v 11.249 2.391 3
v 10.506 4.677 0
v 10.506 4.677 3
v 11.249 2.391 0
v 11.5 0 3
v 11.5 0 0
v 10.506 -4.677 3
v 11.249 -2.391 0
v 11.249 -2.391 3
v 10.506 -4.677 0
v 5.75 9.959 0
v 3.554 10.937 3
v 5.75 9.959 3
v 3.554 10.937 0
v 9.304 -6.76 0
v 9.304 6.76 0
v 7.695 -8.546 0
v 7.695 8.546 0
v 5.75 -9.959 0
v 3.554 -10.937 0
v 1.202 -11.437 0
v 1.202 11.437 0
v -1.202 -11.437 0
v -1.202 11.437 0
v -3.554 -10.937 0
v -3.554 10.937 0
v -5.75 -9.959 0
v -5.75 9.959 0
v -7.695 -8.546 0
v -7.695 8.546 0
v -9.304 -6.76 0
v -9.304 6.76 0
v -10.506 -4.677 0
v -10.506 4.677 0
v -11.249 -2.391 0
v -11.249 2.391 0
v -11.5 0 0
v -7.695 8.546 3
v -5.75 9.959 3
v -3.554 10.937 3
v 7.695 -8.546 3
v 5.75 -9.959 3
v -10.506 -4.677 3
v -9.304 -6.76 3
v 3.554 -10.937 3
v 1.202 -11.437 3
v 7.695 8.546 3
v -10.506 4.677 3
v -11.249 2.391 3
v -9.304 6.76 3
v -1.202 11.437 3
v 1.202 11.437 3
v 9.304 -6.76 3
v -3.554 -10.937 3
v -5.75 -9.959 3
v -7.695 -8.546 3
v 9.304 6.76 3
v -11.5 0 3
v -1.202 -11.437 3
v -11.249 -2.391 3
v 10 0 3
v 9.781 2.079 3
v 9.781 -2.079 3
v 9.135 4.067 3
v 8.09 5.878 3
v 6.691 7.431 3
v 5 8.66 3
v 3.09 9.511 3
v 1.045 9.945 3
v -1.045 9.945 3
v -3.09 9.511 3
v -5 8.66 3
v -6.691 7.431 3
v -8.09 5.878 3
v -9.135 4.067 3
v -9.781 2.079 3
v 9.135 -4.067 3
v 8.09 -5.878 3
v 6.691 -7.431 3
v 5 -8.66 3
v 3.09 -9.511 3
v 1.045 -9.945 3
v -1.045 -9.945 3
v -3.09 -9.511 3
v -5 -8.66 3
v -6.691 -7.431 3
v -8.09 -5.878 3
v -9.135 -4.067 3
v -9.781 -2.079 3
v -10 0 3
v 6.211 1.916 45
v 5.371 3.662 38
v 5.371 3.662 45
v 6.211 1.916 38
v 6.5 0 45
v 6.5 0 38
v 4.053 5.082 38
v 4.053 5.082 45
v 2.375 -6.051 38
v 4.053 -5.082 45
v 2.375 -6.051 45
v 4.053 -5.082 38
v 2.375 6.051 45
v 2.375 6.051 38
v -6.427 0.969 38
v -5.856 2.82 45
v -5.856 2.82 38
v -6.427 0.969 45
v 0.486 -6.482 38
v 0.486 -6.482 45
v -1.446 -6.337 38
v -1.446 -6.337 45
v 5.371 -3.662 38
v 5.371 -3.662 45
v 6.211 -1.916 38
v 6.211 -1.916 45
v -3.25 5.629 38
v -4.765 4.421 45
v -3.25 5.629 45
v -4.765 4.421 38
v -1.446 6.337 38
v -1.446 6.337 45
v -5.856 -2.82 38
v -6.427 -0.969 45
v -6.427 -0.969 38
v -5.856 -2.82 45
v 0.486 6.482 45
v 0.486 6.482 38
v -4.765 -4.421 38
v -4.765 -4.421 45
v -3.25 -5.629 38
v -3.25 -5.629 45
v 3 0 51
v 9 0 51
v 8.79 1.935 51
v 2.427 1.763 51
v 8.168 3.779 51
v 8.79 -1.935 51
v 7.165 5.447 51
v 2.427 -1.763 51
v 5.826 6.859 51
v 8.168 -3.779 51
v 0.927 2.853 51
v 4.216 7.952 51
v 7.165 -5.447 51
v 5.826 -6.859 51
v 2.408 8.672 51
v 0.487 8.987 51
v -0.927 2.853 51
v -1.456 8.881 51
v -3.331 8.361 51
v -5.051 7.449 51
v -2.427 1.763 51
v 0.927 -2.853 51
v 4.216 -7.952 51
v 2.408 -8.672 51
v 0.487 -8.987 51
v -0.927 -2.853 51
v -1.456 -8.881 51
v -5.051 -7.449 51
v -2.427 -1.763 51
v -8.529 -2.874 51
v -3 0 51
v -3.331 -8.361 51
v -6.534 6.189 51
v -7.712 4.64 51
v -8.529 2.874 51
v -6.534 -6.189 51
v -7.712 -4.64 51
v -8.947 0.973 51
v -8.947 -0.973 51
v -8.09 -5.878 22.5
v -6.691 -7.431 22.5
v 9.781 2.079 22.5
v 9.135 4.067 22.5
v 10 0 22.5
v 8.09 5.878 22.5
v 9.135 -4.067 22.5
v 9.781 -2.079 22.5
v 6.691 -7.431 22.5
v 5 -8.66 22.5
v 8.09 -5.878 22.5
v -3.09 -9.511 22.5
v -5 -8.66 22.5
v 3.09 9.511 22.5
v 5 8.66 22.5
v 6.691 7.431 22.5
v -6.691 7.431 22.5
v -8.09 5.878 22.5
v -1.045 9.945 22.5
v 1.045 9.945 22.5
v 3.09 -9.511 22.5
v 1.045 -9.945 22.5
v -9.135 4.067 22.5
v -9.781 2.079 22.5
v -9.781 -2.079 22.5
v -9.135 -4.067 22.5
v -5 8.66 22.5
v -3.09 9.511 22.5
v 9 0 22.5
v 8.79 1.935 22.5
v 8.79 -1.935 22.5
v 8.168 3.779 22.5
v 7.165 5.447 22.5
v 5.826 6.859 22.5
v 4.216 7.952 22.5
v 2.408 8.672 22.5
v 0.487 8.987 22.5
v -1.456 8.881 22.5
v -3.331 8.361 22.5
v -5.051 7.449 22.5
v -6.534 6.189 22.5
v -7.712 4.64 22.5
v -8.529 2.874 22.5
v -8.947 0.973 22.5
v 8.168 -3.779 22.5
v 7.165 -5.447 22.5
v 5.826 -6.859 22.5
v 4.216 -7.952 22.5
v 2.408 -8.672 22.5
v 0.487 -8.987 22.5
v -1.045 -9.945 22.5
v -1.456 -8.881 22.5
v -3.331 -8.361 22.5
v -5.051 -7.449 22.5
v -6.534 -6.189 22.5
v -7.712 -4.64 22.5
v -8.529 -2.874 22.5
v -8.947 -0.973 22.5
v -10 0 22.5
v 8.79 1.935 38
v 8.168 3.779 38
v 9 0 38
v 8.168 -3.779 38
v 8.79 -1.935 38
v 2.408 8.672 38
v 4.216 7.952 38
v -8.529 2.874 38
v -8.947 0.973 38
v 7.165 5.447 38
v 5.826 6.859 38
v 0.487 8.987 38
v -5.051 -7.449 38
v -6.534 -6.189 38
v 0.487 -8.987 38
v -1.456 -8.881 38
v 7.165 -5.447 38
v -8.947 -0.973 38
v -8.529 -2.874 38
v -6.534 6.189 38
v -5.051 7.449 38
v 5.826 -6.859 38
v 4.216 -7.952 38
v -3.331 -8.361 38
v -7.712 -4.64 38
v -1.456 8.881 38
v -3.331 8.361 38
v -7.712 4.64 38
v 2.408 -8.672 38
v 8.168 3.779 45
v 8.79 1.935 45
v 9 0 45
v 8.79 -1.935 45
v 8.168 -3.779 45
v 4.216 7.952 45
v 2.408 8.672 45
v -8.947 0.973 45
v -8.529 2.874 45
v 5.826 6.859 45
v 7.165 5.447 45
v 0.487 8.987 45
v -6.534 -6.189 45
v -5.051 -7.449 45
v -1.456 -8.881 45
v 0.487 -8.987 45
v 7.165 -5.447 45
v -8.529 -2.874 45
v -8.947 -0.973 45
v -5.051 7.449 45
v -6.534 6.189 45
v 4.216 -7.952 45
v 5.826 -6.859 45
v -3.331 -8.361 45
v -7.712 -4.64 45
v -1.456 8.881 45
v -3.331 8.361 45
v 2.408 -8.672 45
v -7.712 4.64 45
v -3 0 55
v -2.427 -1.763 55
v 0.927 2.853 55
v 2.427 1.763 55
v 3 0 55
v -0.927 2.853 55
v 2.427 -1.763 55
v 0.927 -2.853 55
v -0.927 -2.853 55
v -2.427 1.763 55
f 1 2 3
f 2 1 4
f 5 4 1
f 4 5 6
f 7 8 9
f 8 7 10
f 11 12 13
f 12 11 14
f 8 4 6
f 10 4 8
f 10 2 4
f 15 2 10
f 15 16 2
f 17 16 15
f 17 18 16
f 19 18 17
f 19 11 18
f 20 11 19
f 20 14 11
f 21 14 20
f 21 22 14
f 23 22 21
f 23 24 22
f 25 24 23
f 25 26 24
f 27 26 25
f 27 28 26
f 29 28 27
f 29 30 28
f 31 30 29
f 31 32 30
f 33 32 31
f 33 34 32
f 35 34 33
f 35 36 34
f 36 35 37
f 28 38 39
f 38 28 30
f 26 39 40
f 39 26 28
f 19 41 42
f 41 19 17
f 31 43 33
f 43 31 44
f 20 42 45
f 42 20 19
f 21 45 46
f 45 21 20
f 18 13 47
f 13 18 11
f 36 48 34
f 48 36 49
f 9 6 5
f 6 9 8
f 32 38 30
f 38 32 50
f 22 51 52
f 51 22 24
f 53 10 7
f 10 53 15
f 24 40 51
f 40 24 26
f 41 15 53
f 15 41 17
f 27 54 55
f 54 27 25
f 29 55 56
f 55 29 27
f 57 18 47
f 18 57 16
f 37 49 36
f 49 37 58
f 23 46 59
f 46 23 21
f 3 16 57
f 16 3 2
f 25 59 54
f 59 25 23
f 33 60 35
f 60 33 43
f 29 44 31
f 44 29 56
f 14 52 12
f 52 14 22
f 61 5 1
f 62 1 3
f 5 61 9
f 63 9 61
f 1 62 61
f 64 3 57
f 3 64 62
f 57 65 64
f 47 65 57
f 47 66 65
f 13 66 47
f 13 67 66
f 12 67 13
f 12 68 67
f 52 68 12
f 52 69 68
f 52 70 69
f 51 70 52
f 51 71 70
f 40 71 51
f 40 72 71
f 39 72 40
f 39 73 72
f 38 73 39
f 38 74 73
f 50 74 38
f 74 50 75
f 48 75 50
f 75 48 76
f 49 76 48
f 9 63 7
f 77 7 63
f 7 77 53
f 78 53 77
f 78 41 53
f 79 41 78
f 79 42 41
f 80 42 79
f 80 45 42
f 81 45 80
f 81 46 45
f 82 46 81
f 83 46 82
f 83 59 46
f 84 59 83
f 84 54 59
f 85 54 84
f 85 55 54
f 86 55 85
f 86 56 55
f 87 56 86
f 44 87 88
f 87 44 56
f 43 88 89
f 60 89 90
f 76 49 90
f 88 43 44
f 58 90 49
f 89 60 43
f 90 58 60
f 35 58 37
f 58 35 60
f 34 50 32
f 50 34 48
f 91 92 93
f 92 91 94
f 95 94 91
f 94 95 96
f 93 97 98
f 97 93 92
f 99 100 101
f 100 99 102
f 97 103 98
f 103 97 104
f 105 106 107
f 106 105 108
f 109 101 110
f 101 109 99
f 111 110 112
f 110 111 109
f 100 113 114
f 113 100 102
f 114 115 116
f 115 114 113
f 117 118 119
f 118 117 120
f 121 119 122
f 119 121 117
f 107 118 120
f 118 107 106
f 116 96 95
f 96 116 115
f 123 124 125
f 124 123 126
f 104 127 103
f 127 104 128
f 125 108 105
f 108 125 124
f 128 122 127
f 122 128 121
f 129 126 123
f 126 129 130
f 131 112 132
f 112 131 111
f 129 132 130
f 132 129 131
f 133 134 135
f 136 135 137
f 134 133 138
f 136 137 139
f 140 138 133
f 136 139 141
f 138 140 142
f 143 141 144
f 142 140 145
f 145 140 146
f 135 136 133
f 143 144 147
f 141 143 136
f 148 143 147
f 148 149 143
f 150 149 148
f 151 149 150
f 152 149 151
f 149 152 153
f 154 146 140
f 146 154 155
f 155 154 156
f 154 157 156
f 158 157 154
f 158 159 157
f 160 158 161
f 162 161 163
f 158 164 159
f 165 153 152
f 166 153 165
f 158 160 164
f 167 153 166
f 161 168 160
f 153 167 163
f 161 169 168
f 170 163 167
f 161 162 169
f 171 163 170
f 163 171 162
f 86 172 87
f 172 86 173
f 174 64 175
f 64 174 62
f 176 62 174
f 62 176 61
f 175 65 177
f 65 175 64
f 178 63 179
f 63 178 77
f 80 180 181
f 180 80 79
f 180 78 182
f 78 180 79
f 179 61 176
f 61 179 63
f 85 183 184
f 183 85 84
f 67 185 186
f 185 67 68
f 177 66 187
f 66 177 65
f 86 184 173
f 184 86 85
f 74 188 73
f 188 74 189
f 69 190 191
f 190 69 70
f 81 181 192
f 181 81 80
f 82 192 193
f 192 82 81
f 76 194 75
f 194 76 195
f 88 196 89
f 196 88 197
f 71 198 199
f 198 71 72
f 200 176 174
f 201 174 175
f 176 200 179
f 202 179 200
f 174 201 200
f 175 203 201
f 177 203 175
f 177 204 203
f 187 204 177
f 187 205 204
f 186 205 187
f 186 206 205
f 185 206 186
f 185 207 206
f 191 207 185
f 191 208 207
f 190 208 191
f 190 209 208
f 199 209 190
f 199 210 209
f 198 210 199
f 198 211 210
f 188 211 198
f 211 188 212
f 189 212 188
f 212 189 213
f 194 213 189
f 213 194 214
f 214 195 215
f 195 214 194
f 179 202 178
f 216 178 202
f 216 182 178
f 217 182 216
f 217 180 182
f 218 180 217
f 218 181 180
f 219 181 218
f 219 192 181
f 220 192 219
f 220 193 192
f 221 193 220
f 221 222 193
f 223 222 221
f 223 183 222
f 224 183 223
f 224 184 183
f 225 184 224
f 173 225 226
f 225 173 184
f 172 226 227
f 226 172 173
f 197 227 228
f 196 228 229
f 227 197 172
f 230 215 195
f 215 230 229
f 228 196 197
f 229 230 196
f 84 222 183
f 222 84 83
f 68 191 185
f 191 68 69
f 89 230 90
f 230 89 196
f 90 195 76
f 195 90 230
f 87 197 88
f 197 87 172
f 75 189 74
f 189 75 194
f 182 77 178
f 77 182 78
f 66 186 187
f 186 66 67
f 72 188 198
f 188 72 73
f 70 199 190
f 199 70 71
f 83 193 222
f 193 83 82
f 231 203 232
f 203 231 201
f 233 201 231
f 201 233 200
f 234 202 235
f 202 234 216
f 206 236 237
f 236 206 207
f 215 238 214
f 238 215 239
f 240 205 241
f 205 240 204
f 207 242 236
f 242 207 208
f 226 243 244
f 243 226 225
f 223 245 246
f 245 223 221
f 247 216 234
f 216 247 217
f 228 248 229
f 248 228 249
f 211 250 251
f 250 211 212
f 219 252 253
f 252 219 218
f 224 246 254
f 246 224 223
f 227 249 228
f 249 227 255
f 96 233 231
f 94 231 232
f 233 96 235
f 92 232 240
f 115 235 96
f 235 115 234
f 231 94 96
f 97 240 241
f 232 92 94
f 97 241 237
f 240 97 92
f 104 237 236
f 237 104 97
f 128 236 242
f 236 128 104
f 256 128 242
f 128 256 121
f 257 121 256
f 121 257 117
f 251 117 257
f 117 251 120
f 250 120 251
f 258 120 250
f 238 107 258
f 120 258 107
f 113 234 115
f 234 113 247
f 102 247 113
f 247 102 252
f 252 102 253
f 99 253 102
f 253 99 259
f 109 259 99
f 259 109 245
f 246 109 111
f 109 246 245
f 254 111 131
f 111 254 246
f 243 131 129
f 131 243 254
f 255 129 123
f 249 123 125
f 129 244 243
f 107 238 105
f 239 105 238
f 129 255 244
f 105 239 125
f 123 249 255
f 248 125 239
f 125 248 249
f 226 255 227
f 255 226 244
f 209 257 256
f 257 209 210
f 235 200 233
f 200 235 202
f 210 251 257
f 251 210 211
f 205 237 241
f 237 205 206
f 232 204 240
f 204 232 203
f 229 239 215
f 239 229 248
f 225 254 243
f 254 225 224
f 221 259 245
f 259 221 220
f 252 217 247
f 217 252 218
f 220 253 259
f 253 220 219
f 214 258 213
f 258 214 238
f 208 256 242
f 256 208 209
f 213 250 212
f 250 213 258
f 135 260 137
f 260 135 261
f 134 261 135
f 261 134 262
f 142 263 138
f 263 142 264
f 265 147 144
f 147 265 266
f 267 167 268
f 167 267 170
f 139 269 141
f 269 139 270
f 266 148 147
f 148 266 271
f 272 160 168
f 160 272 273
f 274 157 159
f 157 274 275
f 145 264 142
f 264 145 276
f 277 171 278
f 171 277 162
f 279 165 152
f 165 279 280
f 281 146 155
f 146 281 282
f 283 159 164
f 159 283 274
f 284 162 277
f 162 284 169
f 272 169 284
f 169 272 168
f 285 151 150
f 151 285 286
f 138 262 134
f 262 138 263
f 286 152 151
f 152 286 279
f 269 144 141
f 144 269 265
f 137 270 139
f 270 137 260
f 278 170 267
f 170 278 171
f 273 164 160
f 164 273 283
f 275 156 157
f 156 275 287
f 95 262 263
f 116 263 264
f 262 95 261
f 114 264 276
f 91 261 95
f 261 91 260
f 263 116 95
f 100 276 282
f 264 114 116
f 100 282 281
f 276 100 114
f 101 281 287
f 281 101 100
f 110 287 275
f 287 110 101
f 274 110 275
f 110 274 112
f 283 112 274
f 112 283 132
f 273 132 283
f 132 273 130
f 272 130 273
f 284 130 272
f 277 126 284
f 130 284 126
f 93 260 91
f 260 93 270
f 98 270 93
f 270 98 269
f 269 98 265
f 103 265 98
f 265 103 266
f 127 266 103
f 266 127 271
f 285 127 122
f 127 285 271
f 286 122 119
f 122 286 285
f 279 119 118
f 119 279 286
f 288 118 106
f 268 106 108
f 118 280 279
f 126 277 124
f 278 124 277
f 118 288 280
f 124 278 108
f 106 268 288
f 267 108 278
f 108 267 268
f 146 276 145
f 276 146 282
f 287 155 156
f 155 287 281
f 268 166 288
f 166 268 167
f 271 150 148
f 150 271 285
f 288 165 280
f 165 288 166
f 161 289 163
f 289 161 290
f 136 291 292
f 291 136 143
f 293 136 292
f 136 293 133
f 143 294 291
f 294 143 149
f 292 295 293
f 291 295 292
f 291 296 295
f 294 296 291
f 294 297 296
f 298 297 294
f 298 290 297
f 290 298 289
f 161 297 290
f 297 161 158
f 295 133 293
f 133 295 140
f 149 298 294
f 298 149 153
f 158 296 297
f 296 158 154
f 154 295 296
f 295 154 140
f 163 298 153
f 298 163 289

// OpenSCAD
cylinder(h=3, d=23, center=false);
cylinder(h=51,d=13,center=false);
cylinder(h=22.5,d=20,center=false);
cylinder(h=38, d=18, center=false);

translate([0, 0, 45])
  cylinder(h=6,d=18,center=false);

translate([0, 0, 51])
  cylinder(h=4,d=6,center=false);
